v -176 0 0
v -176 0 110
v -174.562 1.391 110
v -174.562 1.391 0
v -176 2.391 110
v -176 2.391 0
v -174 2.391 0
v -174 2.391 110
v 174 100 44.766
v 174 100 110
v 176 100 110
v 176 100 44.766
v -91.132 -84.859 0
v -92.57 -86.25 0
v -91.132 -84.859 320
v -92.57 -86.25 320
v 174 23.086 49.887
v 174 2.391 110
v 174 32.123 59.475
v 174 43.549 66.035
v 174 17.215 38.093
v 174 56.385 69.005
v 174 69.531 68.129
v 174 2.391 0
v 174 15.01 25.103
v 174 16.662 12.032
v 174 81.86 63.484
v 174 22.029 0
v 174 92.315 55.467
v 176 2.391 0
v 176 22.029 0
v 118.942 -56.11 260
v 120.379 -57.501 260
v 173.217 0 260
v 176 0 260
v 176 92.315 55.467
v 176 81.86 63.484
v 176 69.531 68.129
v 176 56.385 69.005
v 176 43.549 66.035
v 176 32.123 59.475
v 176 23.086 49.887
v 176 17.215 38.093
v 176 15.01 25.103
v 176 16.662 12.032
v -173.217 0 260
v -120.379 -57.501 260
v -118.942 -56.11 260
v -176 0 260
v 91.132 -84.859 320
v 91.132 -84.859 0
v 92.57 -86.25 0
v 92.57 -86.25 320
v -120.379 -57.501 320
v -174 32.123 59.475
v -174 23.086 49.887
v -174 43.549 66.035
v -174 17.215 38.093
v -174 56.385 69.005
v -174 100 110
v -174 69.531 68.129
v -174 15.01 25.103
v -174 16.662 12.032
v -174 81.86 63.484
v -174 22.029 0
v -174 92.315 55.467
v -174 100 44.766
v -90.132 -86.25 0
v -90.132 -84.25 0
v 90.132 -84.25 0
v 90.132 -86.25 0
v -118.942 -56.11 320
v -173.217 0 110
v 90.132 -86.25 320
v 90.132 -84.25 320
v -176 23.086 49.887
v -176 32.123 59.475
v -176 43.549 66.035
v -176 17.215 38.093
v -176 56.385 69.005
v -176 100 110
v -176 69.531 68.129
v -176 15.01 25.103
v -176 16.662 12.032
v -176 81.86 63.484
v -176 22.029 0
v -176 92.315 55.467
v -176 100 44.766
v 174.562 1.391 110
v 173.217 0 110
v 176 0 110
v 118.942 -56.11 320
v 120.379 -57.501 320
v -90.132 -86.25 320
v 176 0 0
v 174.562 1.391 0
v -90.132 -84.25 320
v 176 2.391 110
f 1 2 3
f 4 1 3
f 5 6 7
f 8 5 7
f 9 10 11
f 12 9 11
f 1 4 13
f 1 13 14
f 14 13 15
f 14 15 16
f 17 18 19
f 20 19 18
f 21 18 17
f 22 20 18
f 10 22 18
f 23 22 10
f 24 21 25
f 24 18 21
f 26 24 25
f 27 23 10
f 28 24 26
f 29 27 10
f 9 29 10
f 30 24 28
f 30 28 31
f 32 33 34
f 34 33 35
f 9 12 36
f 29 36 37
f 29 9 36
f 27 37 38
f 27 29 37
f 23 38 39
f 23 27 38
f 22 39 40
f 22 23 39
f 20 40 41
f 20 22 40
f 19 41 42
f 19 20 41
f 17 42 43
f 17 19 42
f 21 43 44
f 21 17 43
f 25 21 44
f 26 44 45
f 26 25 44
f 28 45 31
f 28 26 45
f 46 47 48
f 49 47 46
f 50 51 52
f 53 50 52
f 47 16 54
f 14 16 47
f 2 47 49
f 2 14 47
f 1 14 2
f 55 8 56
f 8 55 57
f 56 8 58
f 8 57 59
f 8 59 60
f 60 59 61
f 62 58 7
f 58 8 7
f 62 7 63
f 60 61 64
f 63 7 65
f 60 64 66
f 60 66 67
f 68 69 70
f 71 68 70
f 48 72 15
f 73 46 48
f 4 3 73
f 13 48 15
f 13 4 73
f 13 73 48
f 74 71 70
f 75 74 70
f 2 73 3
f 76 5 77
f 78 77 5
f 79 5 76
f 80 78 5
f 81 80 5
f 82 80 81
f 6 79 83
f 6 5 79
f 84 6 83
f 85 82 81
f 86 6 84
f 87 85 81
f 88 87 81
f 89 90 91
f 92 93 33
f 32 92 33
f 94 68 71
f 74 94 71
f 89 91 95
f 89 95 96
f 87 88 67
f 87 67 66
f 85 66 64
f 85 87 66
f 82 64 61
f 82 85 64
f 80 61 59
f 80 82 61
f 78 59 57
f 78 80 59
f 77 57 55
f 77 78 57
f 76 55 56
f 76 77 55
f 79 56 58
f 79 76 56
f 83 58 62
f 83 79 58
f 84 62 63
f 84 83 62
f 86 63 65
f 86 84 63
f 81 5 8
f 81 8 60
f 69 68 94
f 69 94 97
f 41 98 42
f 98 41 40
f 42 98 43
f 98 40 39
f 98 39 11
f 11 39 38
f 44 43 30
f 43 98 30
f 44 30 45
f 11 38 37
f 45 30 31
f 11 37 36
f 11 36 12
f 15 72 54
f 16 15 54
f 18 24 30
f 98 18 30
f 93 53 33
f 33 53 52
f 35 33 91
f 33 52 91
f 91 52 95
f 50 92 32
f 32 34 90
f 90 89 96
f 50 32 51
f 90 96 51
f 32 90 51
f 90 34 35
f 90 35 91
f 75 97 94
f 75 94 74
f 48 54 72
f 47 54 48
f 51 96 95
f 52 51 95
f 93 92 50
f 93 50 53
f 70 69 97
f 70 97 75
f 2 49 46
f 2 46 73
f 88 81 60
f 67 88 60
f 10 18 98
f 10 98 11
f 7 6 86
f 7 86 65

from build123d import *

# Parameters (mm, degrees)
BOSS_EXTRU_1_DEPTH           = 320
ESQUISSE2_W                  = 2
ESQUISSE2_H                  = 97.60948201
BOSS_EXTRU_1_2_DEPTH         = 320
BOSS_EXTRU_1_3_DEPTH         = 320
ESQUISSE2_W_2                = 180.264962804
ESQUISSE2_H_2                = 2
BOSS_EXTRU_1_4_DEPTH         = 320
BOSS_EXTRU_1_5_DEPTH         = 320
ENL_V_MAT_EXTRU_1_DEPTH      = 379.650234385
ENL_V_MAT_EXTRU_1_DEPTH_BACK = 379.650234385
ESQUISSE3_W                  = 210
ESQUISSE3_H                  = 100
ESQUISSE4_W                  = 60
ESQUISSE4_H                  = 80
ENL_V_MAT_EXTRU_2_DEPTH      = 458.137038923
ENL_V_START                  = -352
ENL_V_MAT_EXTRU_3_DEPTH      = 352


# Read off the part's stored shape, not the designer's step: Enlèv. mat.-Extru.3
with BuildPart() as part:
    # Esquisse2 → Boss.-Extru.1 (new body)
    with BuildSketch(Plane.XY):
        Polygon((-92.57, -86.25), (-176, 0), (-174.562481402, 1.39051799), (-91.132481402, -84.85948201), align=None)
    extrude(amount=BOSS_EXTRU_1_DEPTH)


with BuildPart() as body_2:
    # Esquisse2 → Boss.-Extru.1 2 (new body)
    with BuildSketch(Plane.XY):
        with Locations((-175, 51.195258995)):
            Rectangle(ESQUISSE2_W, ESQUISSE2_H)
    extrude(amount=BOSS_EXTRU_1_2_DEPTH)


with BuildPart() as body_3:
    # Esquisse2 → Boss.-Extru.1 3 (new body)
    with BuildSketch(Plane.XY):
        Polygon((92.57, -86.25), (176, 0), (174.562481402, 1.39051799), (91.132481402, -84.85948201), align=None)
    extrude(amount=BOSS_EXTRU_1_3_DEPTH)


with BuildPart() as body_4:
    # Esquisse2 → Boss.-Extru.1 4 (new body)
    with BuildSketch(Plane.XY):
        with Locations((0, -85.25)):
            Rectangle(ESQUISSE2_W_2, ESQUISSE2_H_2)
    extrude(amount=BOSS_EXTRU_1_4_DEPTH)


with BuildPart() as body_5:
    # Esquisse2 → Boss.-Extru.1 5 (new body)
    with BuildSketch(Plane.XY):
        with Locations((175, 51.195258995)):
            Rectangle(ESQUISSE2_W, ESQUISSE2_H)
    extrude(amount=BOSS_EXTRU_1_5_DEPTH)


with BuildPart() as enl_v_mat_extru_1_tool:
    # Esquisse3 → Enlèv. mat.-Extru.1 (new, two sides: drawn at the far end of the back side and taken through both)
    with BuildSketch(Plane(origin=(0, 0, 0), x_dir=(0, 0, -1), z_dir=(1, 0, 0)).offset(-ENL_V_MAT_EXTRU_1_DEPTH_BACK)):
        with Locations((-215, 50)):
            Rectangle(ESQUISSE3_W, ESQUISSE3_H)
    extrude(amount=ENL_V_MAT_EXTRU_1_DEPTH + ENL_V_MAT_EXTRU_1_DEPTH_BACK)


with BuildPart() as part_1:
    add(part.part)

    # Enlèv. mat.-Extru.1: cut by enl_v_mat_extru_1_tool
    add(enl_v_mat_extru_1_tool.part, mode=Mode.SUBTRACT)


with BuildPart() as body_2_1:
    add(body_2.part)

    # Enlèv. mat.-Extru.1: cut by enl_v_mat_extru_1_tool
    add(enl_v_mat_extru_1_tool.part, mode=Mode.SUBTRACT)


with BuildPart() as body_3_1:
    add(body_3.part)

    # Enlèv. mat.-Extru.1: cut by enl_v_mat_extru_1_tool
    add(enl_v_mat_extru_1_tool.part, mode=Mode.SUBTRACT)

    # Esquisse4 → Enlèv. mat.-Extru.2 (cut, symmetric)
    with BuildSketch(Plane(origin=(90.924227664, -87.951400742, 0), x_dir=(0, 0, -1), z_dir=(0.718759299008584, -0.6952589949714343, 0))):
        with Locations((-290, 82.365583115)):
            Rectangle(ESQUISSE4_W, ESQUISSE4_H)
    enl_v_mat_extru_2 = extrude(amount=ENL_V_MAT_EXTRU_2_DEPTH, both=True, mode=Mode.SUBTRACT)


with BuildPart() as body_5_1:
    add(body_5.part)

    # Enlèv. mat.-Extru.1: cut by enl_v_mat_extru_1_tool
    add(enl_v_mat_extru_1_tool.part, mode=Mode.SUBTRACT)


with BuildPart() as part_2:
    add(part_1.part)

    # Symétrie2: Enlèv. mat.-Extru.2 across plane
    add(enl_v_mat_extru_2.mirror(Plane(origin=(0, 0, 0), x_dir=(0, 0, 1), z_dir=(1, 0, 0))), mode=Mode.SUBTRACT)


with BuildPart() as enl_v_mat_extru_3_tool:
    # Enlèv. mat.-Extru.3 outline → Enlèv. mat.-Extru.3 (new body)
    with BuildSketch(Plane(origin=(176, 0, 0), x_dir=(0, 0, -1), z_dir=(1, 0, 0)).offset(ENL_V_START)):
        with BuildLine():
            Line((0, 100), (-44.765528128, 100))
            ThreePointArc((-44.765528128, 100), (-63.175407163, 37.594250832), (0, 22.029254682))
            Line((0, 22.029254682), (0, 100))
        make_face()
    extrude(amount=ENL_V_MAT_EXTRU_3_DEPTH)


with BuildPart() as body_2_2:
    add(body_2_1.part)

    # Enlèv. mat.-Extru.3: cut by enl_v_mat_extru_3_tool
    add(enl_v_mat_extru_3_tool.part, mode=Mode.SUBTRACT)


with BuildPart() as body_5_2:
    add(body_5_1.part)

    # Enlèv. mat.-Extru.3: cut by enl_v_mat_extru_3_tool
    add(enl_v_mat_extru_3_tool.part, mode=Mode.SUBTRACT)


solid = Compound([body_4.part, body_3_1.part, part_2.part, body_2_2.part, body_5_2.part])
